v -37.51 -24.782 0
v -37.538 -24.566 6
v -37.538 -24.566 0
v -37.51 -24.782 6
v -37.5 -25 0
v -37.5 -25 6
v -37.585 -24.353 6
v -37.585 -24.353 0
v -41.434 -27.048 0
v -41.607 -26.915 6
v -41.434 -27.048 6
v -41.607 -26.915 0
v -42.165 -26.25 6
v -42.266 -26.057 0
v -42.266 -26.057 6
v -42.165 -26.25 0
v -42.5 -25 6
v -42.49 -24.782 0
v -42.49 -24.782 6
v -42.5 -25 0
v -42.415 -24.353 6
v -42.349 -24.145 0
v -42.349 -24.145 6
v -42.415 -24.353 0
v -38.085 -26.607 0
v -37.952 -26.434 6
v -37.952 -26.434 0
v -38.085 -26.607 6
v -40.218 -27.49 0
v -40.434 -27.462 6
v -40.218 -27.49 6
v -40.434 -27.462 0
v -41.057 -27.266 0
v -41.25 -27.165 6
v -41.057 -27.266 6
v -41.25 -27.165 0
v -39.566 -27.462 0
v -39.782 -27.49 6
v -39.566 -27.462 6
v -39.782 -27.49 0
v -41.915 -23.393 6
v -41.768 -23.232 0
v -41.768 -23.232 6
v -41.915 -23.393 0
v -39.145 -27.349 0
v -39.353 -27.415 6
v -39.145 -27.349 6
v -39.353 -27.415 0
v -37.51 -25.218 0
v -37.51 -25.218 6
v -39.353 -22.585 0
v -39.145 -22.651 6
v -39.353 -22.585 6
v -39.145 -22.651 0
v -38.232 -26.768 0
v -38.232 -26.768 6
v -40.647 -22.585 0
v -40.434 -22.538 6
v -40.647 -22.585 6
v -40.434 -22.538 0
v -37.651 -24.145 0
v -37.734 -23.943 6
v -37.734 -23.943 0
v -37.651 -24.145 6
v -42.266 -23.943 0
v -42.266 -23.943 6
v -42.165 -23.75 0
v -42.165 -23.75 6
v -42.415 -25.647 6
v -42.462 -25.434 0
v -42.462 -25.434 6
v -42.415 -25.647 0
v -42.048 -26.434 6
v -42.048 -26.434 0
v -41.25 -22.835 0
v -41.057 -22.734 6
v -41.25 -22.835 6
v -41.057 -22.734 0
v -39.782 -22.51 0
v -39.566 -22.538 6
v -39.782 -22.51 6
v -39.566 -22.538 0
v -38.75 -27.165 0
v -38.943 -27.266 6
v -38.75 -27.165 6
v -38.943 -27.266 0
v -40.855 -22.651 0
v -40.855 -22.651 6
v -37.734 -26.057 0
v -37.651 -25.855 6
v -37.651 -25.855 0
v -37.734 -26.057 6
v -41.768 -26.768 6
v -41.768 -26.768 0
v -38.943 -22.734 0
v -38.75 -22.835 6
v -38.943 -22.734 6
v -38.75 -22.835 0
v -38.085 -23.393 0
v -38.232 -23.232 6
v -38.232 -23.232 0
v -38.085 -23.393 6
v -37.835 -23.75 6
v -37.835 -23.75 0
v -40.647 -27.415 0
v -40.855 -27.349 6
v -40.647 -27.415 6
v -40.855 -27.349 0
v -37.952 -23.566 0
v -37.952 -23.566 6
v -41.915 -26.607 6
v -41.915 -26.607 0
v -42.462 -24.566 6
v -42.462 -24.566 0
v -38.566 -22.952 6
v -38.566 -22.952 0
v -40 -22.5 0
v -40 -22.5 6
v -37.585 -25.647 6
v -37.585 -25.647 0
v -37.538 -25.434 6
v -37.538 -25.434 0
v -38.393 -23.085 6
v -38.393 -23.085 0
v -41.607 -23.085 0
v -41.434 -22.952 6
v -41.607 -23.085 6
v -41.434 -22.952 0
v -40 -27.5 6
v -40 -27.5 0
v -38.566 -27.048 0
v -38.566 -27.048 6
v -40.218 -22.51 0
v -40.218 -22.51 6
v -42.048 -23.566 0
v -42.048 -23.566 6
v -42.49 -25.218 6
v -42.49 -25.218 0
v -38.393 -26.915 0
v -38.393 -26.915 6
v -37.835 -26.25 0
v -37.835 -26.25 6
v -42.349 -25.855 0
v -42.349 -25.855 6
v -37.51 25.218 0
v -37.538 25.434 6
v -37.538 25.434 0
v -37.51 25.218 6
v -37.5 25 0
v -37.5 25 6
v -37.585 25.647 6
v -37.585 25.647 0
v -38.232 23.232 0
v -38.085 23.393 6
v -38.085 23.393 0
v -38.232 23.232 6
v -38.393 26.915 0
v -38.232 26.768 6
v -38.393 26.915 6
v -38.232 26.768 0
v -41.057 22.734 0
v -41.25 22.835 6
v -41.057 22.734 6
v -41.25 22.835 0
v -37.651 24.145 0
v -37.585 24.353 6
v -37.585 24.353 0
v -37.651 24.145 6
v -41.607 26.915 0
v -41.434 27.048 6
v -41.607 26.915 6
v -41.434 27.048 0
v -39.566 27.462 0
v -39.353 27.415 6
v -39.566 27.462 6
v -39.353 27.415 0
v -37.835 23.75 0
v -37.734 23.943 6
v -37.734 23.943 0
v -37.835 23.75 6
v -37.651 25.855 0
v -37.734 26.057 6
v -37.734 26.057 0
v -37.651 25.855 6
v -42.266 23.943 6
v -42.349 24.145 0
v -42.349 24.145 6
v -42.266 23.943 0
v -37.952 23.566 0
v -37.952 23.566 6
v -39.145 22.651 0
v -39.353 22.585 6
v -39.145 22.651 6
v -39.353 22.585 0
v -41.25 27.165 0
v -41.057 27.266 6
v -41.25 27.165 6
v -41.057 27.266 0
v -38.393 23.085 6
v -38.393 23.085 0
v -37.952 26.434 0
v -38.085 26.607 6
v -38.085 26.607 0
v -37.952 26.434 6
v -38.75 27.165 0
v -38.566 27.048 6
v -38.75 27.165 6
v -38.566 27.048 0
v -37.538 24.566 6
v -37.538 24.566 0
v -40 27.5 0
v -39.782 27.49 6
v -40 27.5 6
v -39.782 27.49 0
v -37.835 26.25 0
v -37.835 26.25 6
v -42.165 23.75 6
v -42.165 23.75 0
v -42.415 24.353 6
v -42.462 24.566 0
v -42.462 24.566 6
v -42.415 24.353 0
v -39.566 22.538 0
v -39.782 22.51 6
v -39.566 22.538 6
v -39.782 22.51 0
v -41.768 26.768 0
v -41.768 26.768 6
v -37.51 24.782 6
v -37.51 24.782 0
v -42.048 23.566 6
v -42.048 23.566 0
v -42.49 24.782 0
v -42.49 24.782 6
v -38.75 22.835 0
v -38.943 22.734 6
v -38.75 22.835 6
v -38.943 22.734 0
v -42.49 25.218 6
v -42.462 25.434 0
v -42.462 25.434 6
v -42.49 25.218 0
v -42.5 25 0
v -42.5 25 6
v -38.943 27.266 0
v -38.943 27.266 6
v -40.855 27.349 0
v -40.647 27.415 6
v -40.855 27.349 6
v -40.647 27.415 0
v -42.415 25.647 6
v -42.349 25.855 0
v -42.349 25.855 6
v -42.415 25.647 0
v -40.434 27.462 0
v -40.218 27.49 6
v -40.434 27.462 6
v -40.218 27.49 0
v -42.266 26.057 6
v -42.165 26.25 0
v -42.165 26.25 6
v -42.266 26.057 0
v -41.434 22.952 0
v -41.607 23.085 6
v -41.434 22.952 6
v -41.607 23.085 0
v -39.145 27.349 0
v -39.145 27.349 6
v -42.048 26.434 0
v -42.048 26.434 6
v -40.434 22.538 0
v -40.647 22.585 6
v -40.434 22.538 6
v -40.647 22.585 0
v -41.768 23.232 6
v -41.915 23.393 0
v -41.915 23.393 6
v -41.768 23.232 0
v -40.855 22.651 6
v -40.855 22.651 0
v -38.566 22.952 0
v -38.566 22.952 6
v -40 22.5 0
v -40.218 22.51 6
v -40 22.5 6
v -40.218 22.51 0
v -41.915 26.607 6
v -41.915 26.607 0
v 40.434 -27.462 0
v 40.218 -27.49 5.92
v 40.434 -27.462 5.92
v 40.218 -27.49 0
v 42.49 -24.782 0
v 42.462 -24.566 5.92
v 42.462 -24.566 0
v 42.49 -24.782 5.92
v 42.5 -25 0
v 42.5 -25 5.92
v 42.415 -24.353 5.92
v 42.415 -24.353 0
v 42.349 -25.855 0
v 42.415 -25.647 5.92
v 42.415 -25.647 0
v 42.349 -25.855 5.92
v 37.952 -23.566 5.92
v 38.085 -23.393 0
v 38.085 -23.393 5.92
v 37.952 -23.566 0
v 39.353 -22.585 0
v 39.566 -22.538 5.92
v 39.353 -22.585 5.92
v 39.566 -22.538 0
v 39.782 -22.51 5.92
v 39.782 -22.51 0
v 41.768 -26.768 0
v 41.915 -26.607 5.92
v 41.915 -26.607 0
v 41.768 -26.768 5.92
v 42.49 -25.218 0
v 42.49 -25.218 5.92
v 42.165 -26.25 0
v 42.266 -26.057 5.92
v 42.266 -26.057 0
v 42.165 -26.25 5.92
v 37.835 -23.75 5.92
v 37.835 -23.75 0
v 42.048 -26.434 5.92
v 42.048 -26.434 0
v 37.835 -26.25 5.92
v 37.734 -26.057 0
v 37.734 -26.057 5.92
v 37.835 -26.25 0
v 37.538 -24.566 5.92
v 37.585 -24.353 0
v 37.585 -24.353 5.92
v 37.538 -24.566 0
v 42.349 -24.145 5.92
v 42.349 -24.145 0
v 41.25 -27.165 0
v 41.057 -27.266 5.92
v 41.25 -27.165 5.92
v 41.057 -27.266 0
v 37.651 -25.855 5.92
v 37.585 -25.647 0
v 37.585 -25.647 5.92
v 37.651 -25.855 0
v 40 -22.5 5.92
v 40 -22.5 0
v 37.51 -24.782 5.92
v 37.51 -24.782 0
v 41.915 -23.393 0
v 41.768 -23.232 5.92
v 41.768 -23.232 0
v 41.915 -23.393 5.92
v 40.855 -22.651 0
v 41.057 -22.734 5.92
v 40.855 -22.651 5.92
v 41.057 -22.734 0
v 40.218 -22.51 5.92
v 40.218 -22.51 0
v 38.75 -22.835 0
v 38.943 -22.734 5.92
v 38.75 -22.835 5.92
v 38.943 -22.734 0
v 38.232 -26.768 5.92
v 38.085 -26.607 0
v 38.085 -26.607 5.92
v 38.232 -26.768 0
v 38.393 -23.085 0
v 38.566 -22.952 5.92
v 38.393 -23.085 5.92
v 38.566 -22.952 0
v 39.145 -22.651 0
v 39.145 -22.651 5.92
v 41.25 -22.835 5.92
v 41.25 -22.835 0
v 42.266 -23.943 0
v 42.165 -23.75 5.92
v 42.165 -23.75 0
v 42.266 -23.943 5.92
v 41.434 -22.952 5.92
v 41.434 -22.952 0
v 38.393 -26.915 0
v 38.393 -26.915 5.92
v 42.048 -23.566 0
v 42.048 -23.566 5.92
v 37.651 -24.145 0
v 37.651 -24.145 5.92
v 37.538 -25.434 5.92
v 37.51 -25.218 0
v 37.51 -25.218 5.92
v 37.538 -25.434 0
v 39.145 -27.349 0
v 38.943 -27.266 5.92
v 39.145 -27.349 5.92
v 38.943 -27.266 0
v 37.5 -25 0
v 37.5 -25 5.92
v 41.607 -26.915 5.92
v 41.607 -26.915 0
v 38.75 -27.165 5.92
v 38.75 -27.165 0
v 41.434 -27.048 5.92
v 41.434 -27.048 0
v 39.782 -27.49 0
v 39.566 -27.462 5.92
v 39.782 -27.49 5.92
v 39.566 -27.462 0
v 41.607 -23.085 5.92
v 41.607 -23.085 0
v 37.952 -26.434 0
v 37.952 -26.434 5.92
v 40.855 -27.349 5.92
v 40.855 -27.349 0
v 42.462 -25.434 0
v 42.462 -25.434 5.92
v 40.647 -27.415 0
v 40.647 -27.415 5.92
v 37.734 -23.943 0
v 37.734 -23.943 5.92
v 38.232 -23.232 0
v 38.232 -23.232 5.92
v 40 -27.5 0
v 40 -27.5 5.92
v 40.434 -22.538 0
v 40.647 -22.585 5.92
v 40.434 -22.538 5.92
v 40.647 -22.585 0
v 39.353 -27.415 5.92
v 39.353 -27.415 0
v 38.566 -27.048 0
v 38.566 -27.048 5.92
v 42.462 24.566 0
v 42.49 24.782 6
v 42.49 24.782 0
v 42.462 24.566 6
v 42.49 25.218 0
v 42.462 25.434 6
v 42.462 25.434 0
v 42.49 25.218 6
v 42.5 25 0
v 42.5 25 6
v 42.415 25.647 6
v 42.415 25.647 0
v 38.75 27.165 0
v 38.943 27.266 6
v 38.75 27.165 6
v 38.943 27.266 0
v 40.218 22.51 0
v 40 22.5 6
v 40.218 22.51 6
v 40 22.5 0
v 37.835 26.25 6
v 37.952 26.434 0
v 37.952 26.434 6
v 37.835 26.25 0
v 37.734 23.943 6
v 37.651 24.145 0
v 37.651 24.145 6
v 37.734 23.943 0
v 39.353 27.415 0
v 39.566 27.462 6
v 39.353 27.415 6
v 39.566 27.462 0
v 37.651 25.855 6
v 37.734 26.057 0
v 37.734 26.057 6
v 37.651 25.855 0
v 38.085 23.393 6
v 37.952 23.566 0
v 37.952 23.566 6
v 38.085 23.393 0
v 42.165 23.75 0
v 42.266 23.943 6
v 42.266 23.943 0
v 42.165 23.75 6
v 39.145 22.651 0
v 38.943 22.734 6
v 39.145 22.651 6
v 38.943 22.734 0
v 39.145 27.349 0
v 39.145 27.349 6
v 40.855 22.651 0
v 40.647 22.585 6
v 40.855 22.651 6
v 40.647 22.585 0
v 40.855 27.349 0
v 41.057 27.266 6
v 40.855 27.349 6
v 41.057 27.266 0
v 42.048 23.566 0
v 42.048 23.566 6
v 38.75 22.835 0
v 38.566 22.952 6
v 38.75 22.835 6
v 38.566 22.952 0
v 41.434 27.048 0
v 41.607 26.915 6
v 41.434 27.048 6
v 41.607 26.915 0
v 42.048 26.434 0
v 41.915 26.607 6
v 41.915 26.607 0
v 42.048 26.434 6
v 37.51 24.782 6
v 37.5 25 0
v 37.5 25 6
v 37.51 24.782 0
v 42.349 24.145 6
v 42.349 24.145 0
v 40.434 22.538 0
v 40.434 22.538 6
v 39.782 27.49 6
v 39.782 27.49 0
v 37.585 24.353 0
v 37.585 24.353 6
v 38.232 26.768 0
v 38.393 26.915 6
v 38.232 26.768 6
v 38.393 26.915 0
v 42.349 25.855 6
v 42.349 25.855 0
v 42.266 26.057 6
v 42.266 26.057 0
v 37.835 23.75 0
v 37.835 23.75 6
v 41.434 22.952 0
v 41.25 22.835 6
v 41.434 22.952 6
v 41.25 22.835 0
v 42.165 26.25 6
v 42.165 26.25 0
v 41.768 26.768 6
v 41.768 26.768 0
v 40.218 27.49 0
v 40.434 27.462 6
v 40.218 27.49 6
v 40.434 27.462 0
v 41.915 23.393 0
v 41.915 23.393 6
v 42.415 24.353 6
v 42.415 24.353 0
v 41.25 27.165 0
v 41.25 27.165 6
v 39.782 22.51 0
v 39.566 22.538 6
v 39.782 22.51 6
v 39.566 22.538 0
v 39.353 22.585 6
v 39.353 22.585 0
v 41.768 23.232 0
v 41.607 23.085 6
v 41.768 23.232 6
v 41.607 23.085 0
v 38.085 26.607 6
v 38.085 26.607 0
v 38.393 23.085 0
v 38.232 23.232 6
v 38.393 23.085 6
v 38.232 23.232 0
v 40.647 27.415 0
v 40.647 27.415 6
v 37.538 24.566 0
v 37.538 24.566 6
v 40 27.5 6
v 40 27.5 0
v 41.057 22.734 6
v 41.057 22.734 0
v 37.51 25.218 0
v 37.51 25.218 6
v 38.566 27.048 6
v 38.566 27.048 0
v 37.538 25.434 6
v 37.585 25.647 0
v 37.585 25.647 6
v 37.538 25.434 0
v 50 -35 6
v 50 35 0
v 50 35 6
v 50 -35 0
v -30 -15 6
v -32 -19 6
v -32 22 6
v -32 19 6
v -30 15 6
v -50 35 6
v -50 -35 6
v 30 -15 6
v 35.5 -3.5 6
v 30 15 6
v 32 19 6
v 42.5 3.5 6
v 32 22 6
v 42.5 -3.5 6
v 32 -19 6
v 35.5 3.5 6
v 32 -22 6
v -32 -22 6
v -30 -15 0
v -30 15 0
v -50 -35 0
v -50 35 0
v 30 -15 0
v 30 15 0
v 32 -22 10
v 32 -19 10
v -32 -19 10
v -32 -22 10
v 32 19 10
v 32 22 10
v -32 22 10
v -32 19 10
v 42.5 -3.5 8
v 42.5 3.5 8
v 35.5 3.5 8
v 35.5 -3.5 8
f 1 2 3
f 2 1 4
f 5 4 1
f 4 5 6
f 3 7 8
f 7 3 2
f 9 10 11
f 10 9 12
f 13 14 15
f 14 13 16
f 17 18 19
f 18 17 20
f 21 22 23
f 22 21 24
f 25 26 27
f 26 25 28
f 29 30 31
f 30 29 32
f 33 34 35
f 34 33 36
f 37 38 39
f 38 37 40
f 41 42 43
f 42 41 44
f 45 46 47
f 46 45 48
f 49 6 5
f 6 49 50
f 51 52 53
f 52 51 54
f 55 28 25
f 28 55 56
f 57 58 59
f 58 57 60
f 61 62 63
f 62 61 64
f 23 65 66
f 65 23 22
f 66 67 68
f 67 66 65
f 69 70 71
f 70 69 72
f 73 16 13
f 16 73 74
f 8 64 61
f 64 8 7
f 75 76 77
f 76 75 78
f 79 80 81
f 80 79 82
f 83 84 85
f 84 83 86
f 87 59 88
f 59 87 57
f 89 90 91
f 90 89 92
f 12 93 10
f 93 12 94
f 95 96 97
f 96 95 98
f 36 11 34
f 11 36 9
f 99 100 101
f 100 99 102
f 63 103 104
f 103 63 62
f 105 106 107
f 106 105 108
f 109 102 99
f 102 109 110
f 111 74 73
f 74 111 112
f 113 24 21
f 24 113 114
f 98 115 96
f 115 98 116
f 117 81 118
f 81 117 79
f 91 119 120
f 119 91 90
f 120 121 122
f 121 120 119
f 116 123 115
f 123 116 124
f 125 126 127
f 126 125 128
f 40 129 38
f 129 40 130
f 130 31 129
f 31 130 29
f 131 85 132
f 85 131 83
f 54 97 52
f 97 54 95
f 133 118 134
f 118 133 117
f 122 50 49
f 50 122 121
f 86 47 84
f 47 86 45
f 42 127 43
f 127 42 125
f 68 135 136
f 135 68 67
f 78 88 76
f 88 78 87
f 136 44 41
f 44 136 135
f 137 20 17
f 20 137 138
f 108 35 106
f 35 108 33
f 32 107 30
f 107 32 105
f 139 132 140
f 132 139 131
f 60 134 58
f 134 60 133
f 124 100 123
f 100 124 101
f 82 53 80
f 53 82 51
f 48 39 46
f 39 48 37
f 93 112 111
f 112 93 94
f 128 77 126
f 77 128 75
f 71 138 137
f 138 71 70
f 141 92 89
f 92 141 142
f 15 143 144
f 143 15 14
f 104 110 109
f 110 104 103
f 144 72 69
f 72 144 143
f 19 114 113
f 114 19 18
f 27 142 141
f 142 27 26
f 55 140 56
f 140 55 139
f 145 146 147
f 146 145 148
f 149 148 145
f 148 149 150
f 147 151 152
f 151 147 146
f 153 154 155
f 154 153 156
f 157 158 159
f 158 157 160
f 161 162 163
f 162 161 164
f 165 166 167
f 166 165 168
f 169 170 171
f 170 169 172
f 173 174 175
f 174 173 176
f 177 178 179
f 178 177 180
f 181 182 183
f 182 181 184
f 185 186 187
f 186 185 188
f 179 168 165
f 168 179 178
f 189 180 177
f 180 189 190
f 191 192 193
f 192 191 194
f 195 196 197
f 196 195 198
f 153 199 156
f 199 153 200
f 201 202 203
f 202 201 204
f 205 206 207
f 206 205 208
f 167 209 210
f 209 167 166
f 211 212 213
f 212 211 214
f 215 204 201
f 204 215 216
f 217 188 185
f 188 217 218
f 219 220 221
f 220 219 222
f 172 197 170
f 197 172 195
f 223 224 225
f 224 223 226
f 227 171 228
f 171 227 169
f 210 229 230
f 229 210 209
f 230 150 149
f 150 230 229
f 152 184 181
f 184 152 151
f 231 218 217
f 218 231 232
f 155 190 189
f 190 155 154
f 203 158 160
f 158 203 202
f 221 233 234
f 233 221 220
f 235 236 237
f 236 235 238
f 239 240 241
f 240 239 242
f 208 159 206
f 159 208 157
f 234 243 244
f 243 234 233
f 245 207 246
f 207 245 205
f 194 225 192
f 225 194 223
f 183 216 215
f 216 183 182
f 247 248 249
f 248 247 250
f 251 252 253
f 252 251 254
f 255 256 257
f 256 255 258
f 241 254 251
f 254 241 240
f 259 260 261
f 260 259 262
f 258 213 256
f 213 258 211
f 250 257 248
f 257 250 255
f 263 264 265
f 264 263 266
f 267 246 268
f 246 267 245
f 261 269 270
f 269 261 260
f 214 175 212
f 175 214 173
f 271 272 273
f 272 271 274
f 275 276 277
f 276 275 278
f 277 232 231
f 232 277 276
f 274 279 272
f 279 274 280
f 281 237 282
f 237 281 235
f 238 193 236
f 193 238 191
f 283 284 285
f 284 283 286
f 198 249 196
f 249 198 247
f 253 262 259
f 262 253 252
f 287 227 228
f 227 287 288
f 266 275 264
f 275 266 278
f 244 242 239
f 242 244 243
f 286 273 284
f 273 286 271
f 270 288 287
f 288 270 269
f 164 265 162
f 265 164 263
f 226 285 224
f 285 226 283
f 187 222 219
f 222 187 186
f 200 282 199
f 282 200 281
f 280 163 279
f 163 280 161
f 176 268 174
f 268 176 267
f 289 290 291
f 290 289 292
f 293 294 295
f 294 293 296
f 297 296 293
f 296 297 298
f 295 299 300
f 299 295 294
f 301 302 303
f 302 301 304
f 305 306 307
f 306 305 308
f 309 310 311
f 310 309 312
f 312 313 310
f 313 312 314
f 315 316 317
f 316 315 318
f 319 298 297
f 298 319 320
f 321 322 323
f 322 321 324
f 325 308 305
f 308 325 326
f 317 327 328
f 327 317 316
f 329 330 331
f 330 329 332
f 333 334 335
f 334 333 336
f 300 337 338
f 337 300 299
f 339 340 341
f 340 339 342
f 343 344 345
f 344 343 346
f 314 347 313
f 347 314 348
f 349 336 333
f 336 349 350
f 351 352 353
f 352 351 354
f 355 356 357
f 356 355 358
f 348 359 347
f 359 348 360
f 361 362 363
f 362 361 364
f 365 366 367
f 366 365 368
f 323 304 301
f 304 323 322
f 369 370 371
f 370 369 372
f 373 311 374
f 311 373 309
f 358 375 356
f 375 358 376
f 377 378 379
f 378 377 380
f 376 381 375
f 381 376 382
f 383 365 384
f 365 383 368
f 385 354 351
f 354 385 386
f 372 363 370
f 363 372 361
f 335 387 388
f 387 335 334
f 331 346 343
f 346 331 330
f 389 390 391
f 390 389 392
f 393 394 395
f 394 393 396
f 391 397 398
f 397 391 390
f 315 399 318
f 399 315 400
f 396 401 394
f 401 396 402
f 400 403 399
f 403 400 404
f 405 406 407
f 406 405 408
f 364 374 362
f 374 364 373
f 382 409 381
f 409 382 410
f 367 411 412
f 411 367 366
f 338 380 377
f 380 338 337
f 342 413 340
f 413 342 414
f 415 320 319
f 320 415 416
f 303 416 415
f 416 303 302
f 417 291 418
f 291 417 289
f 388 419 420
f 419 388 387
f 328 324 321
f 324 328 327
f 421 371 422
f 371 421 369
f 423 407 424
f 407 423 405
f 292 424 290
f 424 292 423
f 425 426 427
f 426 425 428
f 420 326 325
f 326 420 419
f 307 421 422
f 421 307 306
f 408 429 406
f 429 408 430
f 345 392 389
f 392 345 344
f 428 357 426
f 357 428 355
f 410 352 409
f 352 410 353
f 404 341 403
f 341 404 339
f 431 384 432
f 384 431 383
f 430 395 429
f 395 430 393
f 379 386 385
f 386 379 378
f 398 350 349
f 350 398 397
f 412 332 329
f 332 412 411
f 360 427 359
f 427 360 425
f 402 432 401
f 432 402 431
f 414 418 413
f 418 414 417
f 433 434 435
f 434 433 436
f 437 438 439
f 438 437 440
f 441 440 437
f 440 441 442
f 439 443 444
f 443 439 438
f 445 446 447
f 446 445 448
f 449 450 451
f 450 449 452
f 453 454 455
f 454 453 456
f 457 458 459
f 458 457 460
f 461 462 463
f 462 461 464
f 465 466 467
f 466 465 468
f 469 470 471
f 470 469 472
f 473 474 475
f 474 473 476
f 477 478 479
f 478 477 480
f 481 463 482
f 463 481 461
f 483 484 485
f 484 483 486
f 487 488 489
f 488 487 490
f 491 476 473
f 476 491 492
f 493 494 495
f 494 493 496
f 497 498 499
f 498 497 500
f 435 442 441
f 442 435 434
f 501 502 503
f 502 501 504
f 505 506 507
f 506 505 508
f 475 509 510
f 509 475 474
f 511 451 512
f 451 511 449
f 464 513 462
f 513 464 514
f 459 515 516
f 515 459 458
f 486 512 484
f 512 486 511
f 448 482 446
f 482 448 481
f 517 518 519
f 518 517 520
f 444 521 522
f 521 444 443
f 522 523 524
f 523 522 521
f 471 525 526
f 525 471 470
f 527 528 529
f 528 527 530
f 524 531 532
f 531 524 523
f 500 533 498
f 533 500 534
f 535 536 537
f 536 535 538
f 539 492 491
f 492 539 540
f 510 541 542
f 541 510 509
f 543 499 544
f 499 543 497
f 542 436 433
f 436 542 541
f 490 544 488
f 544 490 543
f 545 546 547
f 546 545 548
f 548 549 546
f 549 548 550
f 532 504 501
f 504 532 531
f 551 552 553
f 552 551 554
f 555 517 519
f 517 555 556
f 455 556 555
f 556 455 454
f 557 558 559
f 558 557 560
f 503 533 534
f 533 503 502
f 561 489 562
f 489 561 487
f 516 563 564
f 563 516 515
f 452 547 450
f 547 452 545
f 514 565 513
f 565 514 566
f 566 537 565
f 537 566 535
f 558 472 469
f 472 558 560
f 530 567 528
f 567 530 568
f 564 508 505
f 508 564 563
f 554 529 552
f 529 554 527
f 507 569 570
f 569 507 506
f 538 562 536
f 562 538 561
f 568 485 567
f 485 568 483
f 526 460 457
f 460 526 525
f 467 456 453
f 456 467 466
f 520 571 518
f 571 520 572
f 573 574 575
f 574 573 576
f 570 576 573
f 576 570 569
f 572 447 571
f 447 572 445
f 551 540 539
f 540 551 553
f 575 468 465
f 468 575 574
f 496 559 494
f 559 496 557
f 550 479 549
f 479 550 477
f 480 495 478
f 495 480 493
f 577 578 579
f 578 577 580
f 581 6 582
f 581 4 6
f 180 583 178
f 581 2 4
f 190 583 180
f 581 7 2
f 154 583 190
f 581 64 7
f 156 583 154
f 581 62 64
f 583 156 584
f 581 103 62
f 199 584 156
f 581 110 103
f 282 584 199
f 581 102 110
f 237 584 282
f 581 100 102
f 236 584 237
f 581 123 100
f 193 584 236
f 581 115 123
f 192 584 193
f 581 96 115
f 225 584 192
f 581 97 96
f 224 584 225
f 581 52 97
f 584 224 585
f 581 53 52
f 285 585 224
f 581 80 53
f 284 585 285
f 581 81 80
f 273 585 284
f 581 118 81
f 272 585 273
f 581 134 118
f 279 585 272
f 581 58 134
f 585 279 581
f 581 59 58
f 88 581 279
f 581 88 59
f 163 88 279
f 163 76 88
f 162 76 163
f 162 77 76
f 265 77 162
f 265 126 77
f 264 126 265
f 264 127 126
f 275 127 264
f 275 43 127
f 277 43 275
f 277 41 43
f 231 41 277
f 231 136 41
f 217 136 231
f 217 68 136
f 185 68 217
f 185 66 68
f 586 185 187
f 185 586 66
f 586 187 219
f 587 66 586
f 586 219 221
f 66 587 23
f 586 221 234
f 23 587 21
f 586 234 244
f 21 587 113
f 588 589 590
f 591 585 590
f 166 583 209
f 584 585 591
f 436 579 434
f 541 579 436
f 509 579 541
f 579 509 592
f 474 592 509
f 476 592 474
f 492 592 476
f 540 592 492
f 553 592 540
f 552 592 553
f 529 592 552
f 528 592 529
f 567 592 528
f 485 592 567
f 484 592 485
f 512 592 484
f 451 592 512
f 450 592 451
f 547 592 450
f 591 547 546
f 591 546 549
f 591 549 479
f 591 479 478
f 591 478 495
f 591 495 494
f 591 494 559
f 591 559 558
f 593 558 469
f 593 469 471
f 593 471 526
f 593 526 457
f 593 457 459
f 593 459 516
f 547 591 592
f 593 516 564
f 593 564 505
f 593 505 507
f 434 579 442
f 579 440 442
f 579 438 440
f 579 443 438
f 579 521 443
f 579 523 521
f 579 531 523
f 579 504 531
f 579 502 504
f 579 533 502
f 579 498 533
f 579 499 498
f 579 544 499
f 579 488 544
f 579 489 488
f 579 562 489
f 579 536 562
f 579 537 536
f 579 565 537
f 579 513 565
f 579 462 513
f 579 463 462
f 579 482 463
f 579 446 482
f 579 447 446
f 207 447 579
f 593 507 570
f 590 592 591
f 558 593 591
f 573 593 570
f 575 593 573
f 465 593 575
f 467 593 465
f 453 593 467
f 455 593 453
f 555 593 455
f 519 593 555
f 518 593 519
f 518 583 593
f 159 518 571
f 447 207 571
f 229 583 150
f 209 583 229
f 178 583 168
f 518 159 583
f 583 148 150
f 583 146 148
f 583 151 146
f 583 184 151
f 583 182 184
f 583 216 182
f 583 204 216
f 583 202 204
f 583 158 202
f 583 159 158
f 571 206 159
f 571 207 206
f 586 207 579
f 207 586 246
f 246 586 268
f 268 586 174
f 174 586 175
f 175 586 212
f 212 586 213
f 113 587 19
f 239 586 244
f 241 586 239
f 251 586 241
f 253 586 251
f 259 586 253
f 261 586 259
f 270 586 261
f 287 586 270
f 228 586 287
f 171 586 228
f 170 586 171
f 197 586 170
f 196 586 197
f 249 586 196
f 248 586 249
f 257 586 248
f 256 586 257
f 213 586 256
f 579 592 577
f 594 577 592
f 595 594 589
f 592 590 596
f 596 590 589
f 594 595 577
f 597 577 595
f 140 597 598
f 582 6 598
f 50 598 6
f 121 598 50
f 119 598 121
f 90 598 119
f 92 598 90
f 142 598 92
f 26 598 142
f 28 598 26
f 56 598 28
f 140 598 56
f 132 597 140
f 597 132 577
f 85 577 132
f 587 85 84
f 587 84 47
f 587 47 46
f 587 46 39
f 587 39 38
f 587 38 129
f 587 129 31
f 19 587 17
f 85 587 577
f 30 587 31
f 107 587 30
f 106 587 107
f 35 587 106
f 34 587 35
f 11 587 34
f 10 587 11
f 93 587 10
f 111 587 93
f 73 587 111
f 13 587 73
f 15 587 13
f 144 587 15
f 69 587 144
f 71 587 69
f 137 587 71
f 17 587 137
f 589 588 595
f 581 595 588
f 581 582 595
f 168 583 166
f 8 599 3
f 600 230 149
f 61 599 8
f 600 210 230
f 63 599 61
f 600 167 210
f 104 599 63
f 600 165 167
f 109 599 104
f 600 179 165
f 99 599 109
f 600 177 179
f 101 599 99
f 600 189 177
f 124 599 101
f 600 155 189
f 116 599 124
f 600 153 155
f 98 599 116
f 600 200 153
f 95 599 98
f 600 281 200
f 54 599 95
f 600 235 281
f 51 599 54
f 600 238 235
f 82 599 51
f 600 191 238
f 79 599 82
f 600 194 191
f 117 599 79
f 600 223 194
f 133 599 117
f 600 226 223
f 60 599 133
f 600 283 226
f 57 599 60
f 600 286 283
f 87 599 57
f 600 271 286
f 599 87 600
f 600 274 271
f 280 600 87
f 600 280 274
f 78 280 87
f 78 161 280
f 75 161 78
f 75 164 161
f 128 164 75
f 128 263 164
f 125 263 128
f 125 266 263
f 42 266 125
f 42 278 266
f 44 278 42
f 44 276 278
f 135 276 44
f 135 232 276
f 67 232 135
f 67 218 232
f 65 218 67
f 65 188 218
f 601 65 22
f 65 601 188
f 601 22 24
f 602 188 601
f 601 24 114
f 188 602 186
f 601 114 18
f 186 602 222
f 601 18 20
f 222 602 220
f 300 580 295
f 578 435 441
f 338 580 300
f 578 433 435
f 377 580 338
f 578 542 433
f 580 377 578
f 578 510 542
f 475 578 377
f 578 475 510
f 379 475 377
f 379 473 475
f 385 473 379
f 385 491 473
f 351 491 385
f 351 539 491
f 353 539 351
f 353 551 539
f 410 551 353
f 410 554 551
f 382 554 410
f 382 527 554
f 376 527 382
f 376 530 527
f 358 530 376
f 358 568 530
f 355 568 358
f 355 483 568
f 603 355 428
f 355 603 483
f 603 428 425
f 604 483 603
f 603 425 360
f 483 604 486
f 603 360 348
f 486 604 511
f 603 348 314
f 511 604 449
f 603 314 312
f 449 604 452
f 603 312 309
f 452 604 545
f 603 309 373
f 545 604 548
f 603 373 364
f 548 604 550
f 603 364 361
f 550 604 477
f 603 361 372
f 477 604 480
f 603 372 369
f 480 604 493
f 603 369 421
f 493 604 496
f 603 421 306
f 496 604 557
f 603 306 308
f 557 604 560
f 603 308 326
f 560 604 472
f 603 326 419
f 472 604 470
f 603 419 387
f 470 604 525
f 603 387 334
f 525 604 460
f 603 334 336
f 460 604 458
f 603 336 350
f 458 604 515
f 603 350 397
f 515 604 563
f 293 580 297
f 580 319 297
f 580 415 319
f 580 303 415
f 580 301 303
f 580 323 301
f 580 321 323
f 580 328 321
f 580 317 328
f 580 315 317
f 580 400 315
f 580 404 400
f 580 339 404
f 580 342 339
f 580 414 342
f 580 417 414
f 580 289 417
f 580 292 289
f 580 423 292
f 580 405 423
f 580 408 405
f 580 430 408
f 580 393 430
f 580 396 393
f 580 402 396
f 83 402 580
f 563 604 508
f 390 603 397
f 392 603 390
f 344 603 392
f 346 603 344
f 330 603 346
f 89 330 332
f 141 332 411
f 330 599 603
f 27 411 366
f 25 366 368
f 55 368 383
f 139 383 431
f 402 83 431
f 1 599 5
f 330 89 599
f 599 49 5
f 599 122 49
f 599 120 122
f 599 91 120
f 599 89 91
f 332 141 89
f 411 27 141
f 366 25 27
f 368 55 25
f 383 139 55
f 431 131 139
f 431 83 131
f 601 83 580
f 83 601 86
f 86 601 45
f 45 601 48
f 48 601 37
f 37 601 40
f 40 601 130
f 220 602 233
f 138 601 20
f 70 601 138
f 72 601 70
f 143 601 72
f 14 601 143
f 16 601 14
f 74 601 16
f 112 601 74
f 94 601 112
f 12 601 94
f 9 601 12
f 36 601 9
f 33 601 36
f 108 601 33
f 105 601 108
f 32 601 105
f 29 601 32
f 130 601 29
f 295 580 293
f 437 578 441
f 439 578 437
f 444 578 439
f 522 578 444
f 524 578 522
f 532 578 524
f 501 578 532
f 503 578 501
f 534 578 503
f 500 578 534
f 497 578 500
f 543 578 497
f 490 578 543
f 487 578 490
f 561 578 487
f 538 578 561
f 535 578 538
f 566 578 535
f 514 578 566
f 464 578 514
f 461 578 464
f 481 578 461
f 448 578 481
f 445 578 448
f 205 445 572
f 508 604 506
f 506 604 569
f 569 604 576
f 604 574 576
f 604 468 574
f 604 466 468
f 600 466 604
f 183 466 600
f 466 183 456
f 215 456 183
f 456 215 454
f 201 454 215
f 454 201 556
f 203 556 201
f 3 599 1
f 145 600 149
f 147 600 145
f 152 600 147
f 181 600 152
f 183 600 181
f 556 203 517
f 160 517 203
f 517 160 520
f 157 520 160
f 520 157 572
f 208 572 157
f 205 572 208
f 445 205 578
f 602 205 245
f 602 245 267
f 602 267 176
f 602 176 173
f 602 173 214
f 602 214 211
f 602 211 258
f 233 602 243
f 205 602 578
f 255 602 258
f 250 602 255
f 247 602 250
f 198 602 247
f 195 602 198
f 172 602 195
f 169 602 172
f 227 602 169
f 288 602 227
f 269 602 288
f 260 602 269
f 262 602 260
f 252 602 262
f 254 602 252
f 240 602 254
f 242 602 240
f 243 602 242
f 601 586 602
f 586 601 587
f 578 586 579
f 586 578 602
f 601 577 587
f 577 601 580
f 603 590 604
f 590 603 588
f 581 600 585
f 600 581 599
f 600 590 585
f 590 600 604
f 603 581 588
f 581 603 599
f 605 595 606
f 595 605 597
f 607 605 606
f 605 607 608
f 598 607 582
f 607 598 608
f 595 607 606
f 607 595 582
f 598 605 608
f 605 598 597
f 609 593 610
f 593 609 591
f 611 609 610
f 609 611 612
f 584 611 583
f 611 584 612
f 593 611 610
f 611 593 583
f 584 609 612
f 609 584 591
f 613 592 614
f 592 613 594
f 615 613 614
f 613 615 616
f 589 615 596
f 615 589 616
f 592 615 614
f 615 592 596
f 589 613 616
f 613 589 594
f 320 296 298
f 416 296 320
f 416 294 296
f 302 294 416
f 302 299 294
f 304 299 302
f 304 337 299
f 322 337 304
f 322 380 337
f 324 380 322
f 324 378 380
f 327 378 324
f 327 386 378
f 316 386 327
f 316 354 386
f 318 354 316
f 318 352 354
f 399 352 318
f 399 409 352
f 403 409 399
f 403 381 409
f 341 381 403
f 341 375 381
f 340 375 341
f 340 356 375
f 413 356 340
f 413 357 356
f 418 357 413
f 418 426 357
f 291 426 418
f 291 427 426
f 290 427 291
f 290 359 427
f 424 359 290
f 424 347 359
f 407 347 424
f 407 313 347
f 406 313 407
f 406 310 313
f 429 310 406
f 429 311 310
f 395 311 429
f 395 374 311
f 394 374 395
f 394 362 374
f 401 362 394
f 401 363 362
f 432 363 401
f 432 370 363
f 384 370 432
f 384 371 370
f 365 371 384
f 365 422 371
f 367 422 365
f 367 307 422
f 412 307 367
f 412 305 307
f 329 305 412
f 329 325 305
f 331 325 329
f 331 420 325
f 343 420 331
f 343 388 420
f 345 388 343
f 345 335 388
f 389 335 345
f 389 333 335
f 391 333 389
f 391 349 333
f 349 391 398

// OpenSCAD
// Microfluidic chip imaging holder — reference solution
// Category: tools; purpose: repeatable positioning during optical chip imaging
// Print on flat base with z=0 on bed; PLA/PETG, no supports; not certified for clinical or sterile use
// SPDX-License-Identifier: CERN-OHL-P-2.0
$fn=72;
eps=0.05;
base_x=100;
base_y=70;
base_h=6;
window_x=60;
window_y=30;
hole_d=5;
hole_pitch_x=80;
hole_pitch_y=50;
rail_len=64;
rail_width=3;
rail_h=4;
rail_center_y=20.5;
marker_x=7;
marker_y=7;
marker_h=2;
marker_center_x=39;
assert(base_x > window_x + 2*hole_d);
assert(base_y > window_y + 2*hole_d);
assert(hole_pitch_x/2+hole_d/2 < base_x/2);
assert(hole_pitch_y/2+hole_d/2 < base_y/2);
assert(rail_center_y - rail_width/2 > window_y/2);
module reference(){
 union(){
  difference(){
   translate([-base_x/2,-base_y/2,0]) cube([base_x,base_y,base_h]);
   translate([-window_x/2,-window_y/2,-eps]) cube([window_x,window_y,base_h+2*eps]);
   for(x=[-hole_pitch_x/2,hole_pitch_x/2])
    for(y=[-hole_pitch_y/2,hole_pitch_y/2])
     translate([x,y,-eps]) cylinder(d=hole_d,h=base_h+2*eps);
  }
  for(y=[-rail_center_y,rail_center_y])
   translate([-rail_len/2,y-rail_width/2,base_h-eps])
    cube([rail_len,rail_width,rail_h+eps]);
  translate([marker_center_x-marker_x/2,-marker_y/2,base_h-eps])
   cube([marker_x,marker_y,marker_h+eps]);
 }
}
reference();

// Near-surface obstruction.
translate([40,-25,5.92])cylinder(d=5.1,h=.08);
